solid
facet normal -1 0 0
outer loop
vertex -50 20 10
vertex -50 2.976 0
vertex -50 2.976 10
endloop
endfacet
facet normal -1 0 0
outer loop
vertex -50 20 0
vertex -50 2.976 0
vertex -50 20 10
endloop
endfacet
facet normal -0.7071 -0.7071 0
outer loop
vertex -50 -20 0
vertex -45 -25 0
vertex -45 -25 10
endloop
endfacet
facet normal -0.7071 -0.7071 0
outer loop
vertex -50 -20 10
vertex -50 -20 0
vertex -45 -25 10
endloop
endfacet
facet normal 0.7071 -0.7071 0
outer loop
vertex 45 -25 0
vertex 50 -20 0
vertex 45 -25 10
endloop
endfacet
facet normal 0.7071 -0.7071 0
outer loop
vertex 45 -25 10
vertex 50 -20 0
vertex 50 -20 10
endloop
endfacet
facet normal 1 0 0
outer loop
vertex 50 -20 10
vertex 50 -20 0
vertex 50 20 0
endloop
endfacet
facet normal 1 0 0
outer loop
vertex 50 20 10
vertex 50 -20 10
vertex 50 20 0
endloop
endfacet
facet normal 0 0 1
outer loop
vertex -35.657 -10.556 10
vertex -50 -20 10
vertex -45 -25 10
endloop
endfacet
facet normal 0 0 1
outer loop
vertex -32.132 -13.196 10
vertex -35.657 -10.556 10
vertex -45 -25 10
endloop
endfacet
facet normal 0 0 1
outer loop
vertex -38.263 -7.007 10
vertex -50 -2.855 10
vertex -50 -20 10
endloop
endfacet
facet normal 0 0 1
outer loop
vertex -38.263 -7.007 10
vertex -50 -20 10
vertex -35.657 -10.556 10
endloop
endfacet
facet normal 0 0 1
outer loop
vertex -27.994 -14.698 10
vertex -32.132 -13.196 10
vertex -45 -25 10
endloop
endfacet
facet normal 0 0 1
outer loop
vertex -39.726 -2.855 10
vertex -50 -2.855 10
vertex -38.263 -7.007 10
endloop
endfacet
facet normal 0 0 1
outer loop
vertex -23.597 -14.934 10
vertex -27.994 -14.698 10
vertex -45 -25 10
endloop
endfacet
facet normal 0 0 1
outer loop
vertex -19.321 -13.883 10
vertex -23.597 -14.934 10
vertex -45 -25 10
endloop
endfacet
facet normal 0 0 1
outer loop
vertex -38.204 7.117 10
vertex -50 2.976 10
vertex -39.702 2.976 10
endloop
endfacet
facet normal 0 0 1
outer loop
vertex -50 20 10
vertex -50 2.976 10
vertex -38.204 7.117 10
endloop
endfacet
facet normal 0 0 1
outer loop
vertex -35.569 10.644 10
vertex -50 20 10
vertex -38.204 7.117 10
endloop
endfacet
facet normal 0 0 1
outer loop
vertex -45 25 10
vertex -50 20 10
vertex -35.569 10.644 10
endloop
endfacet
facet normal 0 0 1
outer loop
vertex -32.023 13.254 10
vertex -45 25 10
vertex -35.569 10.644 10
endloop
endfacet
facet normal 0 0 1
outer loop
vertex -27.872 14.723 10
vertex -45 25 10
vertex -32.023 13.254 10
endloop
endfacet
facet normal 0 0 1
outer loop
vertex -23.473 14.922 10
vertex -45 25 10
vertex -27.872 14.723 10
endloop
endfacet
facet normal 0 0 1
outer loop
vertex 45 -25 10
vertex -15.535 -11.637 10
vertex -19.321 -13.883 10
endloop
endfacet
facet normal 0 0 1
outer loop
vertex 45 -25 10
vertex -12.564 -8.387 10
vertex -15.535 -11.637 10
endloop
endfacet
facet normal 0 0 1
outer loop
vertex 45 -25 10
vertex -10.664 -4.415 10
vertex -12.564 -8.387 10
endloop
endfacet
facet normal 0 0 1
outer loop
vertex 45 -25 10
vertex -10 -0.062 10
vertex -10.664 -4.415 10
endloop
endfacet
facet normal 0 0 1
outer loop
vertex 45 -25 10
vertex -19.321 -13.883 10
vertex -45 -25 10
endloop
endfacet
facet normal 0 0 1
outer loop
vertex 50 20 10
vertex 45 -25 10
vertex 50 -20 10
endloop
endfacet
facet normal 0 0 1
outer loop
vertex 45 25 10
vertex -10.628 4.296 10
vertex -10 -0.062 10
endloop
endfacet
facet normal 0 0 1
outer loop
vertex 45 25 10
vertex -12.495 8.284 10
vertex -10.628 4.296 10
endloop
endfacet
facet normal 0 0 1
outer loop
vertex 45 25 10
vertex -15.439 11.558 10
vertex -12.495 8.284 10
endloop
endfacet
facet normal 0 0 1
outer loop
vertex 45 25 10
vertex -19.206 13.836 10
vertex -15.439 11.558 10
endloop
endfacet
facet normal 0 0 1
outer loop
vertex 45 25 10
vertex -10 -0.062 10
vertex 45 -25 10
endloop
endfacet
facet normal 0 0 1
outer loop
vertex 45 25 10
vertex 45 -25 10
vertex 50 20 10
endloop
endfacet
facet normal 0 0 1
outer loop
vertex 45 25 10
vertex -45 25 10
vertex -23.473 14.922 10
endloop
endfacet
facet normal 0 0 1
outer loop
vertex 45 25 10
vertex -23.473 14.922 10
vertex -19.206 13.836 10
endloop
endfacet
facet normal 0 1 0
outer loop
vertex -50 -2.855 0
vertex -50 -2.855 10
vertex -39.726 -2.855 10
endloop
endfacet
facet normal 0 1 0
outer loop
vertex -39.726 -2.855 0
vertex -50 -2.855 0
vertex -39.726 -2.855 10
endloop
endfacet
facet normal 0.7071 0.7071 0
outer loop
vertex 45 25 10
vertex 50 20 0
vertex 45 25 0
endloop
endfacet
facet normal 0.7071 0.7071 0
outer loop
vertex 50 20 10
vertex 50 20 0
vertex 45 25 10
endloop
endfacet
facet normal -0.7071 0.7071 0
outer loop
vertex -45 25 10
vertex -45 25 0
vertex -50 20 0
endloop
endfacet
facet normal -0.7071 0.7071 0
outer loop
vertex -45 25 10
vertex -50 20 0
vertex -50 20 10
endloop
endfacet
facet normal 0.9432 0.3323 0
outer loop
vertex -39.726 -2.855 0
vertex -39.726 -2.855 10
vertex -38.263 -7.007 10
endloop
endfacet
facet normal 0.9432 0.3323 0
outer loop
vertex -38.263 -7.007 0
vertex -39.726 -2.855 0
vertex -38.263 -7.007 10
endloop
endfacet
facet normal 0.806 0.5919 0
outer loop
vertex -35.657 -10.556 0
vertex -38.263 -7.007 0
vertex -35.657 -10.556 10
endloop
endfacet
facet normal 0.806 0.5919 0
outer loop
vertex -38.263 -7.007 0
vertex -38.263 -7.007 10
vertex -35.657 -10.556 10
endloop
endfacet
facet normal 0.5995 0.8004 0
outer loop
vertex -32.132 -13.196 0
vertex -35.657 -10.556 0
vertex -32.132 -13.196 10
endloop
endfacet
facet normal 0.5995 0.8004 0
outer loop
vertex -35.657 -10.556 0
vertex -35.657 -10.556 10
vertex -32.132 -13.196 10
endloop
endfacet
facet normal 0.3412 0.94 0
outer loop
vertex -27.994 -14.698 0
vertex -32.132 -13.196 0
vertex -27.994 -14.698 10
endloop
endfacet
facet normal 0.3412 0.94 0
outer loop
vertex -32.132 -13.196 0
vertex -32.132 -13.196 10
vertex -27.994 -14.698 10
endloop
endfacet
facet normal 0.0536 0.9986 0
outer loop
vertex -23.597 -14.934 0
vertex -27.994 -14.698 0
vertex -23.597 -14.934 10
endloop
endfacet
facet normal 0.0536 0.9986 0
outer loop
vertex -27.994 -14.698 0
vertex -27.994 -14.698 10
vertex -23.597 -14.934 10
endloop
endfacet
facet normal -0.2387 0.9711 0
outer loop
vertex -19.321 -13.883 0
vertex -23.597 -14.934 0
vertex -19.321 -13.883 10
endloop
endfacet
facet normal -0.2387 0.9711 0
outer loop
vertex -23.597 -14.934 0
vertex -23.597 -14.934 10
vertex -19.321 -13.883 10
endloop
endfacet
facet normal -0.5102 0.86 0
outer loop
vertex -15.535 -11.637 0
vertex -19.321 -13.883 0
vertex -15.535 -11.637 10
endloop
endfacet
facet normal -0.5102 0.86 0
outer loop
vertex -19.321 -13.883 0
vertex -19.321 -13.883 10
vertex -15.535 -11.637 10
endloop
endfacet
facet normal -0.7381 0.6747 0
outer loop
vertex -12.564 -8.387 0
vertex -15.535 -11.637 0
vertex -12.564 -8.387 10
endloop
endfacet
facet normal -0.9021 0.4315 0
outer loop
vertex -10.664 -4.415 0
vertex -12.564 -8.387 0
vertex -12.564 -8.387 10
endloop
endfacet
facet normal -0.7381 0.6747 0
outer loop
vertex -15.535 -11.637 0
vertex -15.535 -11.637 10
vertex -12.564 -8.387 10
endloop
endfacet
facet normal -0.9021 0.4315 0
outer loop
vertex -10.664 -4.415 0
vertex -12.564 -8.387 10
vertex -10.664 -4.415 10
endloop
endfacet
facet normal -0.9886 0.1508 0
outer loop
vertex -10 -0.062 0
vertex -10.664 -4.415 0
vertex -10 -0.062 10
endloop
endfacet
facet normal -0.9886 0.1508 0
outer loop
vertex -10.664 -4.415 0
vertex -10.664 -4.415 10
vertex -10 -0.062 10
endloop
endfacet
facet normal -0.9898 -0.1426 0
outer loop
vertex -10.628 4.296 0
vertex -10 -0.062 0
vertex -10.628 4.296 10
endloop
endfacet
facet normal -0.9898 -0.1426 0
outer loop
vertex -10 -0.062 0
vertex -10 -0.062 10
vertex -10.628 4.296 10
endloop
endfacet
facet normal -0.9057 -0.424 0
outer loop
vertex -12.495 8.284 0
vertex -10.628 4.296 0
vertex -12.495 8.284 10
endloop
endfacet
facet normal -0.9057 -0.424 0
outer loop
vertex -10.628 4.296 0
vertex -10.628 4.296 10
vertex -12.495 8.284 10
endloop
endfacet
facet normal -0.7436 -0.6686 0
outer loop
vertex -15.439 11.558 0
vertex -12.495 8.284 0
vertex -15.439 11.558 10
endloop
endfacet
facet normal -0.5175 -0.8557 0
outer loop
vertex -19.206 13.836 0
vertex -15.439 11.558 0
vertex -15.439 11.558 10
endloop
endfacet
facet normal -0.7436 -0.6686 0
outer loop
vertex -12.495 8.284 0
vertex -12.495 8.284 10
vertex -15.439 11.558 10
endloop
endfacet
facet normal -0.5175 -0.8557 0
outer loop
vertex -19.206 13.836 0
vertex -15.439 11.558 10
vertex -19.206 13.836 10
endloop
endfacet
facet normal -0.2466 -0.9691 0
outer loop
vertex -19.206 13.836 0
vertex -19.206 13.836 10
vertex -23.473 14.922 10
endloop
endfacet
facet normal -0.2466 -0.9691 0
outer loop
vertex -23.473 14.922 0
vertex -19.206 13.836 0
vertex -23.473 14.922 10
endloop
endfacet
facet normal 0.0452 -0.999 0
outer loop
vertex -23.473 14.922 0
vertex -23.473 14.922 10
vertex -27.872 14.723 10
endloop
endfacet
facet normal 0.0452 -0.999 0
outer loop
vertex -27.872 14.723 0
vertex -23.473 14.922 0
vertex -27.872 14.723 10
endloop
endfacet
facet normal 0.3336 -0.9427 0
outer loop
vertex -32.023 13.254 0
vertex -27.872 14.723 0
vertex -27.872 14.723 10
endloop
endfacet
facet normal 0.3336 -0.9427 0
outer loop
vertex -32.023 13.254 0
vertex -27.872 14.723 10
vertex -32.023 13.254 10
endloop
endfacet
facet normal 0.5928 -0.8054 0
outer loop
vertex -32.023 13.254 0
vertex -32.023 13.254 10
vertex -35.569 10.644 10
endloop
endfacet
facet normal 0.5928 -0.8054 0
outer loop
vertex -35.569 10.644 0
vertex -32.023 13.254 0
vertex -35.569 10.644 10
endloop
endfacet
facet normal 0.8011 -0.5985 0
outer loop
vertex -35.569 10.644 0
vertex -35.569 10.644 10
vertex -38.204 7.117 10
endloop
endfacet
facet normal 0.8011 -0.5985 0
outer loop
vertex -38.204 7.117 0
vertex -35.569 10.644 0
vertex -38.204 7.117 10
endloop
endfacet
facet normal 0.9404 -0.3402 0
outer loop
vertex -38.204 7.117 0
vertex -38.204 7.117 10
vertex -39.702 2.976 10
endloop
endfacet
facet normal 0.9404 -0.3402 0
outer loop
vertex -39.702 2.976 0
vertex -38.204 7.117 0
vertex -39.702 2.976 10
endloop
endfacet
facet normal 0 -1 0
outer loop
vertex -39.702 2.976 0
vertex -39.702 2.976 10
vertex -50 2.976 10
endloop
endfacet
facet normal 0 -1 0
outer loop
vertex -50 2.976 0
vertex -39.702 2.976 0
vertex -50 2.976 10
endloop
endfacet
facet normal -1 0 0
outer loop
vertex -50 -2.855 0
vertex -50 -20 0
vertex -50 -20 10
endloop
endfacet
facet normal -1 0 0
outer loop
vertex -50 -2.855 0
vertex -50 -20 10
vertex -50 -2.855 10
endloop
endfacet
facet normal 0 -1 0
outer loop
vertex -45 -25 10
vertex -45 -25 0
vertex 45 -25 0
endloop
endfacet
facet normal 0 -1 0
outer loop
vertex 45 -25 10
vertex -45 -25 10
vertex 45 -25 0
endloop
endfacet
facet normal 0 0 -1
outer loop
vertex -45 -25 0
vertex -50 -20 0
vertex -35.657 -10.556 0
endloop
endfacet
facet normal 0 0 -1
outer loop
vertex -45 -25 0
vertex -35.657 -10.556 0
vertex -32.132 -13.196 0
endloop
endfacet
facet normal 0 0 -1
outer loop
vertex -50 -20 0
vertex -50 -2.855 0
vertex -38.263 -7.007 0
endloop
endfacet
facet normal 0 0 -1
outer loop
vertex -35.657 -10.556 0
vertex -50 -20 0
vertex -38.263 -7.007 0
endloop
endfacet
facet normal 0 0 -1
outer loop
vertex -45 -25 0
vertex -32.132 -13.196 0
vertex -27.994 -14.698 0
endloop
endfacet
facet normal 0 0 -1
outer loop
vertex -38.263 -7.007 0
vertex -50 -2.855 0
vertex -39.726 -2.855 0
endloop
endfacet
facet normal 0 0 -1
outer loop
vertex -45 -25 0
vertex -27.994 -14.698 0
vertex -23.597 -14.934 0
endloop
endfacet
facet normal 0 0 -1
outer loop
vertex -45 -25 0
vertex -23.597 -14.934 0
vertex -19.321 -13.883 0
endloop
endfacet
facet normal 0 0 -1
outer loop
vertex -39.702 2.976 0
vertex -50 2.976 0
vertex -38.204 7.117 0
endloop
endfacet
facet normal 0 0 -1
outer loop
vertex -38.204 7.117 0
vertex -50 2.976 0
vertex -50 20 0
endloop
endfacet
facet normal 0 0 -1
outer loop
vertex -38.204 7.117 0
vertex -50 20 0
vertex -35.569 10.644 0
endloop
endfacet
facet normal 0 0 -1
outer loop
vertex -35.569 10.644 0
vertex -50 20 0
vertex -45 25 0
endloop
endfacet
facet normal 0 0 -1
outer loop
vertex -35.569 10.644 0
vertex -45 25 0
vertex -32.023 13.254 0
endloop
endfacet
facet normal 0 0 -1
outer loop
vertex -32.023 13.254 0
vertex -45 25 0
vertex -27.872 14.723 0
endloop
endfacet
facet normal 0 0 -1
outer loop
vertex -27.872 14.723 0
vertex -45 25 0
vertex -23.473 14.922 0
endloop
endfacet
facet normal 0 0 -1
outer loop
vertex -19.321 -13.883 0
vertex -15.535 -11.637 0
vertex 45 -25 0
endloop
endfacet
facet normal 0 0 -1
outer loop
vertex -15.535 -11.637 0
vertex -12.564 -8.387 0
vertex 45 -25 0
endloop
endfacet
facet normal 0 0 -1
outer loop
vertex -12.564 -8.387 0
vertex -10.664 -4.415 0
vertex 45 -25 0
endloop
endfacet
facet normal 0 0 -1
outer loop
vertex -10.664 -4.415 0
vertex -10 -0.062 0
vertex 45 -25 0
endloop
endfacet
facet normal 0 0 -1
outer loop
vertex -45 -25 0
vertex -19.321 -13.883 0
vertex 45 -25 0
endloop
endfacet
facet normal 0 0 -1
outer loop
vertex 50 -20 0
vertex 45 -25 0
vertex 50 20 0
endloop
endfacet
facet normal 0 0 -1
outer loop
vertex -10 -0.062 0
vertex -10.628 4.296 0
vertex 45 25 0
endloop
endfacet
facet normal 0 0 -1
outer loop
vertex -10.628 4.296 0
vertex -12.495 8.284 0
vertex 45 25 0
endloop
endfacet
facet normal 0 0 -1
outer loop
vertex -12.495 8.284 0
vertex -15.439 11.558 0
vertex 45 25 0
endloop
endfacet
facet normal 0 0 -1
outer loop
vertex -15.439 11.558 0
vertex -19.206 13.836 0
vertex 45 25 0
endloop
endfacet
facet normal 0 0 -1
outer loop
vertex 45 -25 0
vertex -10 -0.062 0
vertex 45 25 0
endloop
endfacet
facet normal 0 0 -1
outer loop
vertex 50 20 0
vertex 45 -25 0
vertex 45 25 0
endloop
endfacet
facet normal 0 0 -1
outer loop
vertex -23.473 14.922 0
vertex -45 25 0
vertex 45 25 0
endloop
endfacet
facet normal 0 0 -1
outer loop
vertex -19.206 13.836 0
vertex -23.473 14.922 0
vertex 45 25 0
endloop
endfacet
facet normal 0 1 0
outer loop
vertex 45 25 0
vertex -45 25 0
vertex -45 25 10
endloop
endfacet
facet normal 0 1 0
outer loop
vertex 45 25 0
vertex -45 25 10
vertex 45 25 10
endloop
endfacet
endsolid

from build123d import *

# Parameters (mm, degrees)
F0_W     = 100
F0_H     = 50
F1_DEPTH = 10
F3_DEPTH = 25
F4_SIZE  = 5


with BuildPart() as f1:
    # F0 (on Top) → F1 (new body)
    with BuildSketch(Plane.XY):
        Rectangle(F0_W, F0_H)
    extrude(amount=F1_DEPTH)

    # F2 (on face) → F3 (cut)
    with BuildSketch(Plane.XY.offset(10)):
        with BuildLine():
            Line((-50, -2.854646), (-39.725862, -2.854646))
            ThreePointArc((-39.725862, -2.854646), (-10.000128, -0.062081), (-39.701728, 2.97644))
            Line((-39.701728, 2.97644), (-50, 2.97644))
            Line((-50, 2.97644), (-50, -2.854646))
        make_face()
    extrude(amount=-F3_DEPTH, mode=Mode.SUBTRACT)

    # F4
    f4_edges = [f1.edges().sort_by_distance(p)[0] for p in [
        (50, 25, 5),
        (50, -25, 5),
        (-50, 25, 5),
        (-50, -25, 5),
    ]]
    chamfer(f4_edges, length=F4_SIZE)


solid = f1.part
